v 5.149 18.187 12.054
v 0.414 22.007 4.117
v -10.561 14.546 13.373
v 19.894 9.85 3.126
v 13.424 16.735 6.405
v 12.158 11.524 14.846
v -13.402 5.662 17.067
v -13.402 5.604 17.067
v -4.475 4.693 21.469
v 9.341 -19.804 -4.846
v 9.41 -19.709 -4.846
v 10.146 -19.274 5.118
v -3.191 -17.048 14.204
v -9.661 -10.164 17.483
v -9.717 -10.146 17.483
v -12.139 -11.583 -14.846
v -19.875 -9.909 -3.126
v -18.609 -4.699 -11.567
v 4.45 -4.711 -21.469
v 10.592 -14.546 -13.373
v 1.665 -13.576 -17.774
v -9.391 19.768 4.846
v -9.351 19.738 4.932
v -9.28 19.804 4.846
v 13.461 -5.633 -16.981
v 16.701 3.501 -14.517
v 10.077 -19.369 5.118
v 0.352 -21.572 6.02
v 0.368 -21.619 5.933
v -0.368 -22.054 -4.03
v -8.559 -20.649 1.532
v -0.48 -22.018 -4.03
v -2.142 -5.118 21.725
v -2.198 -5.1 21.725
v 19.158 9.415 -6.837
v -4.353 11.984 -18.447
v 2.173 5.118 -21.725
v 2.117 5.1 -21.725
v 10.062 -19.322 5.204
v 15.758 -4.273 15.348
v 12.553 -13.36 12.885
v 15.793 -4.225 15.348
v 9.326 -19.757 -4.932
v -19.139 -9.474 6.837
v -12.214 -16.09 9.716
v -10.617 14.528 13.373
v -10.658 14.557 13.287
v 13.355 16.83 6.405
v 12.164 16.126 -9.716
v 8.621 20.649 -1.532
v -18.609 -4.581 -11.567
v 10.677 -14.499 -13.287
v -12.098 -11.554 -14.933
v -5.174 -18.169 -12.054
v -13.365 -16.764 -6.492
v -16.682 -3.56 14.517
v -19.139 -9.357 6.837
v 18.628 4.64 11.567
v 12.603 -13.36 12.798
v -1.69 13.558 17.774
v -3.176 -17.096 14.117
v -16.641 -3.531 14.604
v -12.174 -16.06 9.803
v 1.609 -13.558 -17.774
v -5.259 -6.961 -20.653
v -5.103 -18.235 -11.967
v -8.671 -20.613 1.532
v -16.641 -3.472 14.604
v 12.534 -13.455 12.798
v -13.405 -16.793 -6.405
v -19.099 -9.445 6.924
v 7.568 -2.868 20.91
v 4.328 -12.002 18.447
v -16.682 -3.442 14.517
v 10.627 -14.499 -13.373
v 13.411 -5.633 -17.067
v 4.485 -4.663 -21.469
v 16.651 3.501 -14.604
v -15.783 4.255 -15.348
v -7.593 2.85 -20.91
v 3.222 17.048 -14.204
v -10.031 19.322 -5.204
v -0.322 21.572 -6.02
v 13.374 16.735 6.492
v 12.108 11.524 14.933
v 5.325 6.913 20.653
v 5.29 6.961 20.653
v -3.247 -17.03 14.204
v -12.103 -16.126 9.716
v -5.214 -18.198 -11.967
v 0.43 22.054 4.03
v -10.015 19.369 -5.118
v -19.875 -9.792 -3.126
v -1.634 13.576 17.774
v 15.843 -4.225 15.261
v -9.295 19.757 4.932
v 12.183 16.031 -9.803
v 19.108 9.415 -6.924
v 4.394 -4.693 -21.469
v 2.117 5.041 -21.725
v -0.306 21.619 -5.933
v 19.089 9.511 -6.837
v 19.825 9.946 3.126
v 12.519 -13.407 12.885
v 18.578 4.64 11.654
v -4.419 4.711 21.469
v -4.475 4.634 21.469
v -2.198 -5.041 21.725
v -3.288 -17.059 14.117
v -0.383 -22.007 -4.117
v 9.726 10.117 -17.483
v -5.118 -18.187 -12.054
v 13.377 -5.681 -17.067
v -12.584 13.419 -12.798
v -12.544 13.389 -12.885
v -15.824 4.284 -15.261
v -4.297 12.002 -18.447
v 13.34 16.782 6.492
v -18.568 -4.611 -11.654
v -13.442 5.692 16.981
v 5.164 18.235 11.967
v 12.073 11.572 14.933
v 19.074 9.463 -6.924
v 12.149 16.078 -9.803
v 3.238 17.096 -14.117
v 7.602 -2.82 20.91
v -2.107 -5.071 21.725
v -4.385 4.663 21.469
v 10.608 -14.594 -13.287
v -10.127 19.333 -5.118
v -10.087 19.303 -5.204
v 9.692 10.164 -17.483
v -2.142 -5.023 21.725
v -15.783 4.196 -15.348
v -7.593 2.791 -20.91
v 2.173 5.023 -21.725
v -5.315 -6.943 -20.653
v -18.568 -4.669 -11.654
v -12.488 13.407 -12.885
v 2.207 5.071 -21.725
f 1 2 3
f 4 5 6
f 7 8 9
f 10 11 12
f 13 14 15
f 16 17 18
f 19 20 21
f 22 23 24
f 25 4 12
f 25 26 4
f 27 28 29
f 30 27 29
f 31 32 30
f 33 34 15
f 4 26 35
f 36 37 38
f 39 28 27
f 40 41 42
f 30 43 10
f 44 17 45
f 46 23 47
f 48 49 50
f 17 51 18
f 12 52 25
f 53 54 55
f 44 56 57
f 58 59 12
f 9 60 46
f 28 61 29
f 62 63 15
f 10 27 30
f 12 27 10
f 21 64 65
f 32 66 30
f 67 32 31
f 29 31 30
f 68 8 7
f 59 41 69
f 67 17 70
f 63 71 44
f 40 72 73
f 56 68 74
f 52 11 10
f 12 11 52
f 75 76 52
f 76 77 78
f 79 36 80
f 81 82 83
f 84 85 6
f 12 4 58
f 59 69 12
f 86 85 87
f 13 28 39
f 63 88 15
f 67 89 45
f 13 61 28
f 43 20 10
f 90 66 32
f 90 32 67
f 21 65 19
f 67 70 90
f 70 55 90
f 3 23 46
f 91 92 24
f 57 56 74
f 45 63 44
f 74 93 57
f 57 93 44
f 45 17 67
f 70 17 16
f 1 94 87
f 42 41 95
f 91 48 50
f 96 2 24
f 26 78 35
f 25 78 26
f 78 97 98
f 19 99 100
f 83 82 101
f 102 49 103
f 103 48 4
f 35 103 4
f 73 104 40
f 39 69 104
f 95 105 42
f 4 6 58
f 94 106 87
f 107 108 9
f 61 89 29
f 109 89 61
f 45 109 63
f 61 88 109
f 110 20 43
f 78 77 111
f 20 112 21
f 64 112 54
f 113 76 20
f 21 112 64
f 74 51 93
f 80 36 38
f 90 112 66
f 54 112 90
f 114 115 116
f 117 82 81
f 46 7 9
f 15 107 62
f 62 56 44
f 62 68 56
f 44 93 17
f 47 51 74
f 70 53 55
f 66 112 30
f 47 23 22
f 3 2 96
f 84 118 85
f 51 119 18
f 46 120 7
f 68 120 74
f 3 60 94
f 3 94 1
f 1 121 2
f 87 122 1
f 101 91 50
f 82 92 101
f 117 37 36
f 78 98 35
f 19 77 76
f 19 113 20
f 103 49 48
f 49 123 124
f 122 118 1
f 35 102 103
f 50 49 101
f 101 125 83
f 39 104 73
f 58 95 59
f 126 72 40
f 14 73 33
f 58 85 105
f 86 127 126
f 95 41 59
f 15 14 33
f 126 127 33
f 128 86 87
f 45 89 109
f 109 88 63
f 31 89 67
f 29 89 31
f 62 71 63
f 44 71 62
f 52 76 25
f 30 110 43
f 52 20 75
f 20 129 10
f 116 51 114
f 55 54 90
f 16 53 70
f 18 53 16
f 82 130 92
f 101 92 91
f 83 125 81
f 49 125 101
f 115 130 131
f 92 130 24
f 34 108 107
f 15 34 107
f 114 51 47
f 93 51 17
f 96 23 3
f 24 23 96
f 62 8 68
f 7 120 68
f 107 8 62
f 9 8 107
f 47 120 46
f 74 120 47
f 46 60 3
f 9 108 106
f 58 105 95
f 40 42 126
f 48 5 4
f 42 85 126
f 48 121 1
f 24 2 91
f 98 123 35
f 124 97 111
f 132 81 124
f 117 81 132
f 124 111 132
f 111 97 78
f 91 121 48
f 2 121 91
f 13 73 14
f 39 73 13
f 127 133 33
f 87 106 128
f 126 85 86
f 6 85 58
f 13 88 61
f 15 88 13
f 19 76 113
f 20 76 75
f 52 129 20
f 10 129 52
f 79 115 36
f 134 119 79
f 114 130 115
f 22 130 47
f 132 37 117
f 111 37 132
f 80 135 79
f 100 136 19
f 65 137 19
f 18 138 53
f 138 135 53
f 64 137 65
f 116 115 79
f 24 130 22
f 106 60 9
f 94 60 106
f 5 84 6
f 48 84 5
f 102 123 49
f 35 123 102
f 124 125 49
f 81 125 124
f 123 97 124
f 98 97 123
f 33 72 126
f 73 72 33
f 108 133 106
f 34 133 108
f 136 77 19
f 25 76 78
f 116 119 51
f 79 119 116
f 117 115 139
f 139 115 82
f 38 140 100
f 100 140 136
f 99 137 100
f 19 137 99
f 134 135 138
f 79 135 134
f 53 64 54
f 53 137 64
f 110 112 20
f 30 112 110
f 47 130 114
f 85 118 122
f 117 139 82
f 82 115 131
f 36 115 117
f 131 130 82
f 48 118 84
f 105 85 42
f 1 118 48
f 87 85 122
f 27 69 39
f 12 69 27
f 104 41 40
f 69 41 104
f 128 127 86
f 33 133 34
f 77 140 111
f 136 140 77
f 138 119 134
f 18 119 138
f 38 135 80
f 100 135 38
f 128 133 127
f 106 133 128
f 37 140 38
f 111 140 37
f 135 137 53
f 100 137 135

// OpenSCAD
// Auto-generated OpenSCAD file

    inner_points = 10*[[0.9310411281195976, -1.9708956644454598, -0.48456235421219784], [-0.033699334115551816, 2.1524185182257494, -0.5933185103962525], [-0.03989472684997508, -2.195916826294735, -0.40302069458653744], [-1.0046351890851246, 1.9273973563764744, -0.5117768507705921], [1.0046351890851246, -1.9273973563764744, 0.5117768507705921], [0.03989472684997508, 2.195916826294735, 0.40302069458653744], [0.033699334115551816, -2.1524185182257494, 0.5933185103962525], [-0.9310411281195976, 1.9708956644454598, 0.48456235421219784], [0.4434653698557001, -0.46631153386828283, -2.1382142073749177], [0.21572104012363613, 0.5070709058311078, -2.1638880532059384], [-0.5274704851138725, -0.6913326957175581, -2.0566725477492573], [-0.7552148148459366, 0.2820497439818326, -2.082346393580278], [0.7552148148459366, -0.2820497439818326, 2.082346393580278], [0.5274704851138725, 0.6913326957175581, 2.0566725477492573], [-0.21572104012363613, -0.5070709058311078, 2.1638880532059384], [-0.4434653698557001, 0.46631153386828283, 2.1382142073749177], [-1.9794000073382254, -0.9850428428689444, -0.3126246729896607], [1.9058059463726982, 0.9415445347999587, -0.6837145319931293], [-1.9058059463726982, -0.9415445347999587, 0.6837145319931293], [1.9794000073382254, 0.9850428428689444, 0.3126246729896607], [-0.8589781717453047, -2.055421900397042, 0.1531838416188064], [0.8589781717453047, 2.055421900397042, -0.1531838416188064], [0.16498829102009893, -1.3528633341160017, -1.7687870534721224], [-0.4312541049635078, 1.1954849770692983, -1.83600205447966], [0.4312541049635078, -1.1954849770692983, 1.83600205447966], [-0.16498829102009893, 1.3528633341160017, 1.7687870534721224], [1.6601035855989856, 0.3501270813904757, -1.4517351994968535], [-1.8527753385768673, -0.4640071303681936, -1.1567147034721392], [1.8527753385768673, 0.4640071303681936, 1.1567147034721392], [-1.6601035855989856, -0.3501270813904757, 1.4517351994968535], [1.0576657968809553, -1.4498599519447088, -1.3286523846946763], [0.32066966437787003, 1.7000717910271093, -1.4117346950477099], [-0.5133414173557517, -1.8139518400048271, -1.1967152079212828], [-1.2503375498588372, 1.335979902966991, -1.2797975182743164], [1.2503375498588372, -1.335979902966991, 1.2797975182743164], [0.5133414173557517, 1.8139518400048271, 1.1967152079212828], [-0.32066966437787003, -1.7000717910271093, 1.4117346950477099], [-1.0576657968809553, 1.4498599519447088, 1.3286523846946763], [1.3361428757165568, -0.56330815169699, -1.6980795385974714], [0.9676448094650141, 1.0116577197889192, -1.7396206937739882], [-1.2058001934897236, -1.152421201606384, -1.4846007021984173], [-1.574298259741266, 0.4225446698795252, -1.5261418573749341], [1.574298259741266, -0.4225446698795252, 1.5261418573749341], [1.2058001934897236, 1.152421201606384, 1.4846007021984173], [-0.9676448094650141, -1.0116577197889192, 1.7396206937739882], [-1.3361428757165568, 0.56330815169699, 1.6980795385974714], [-1.332424862251081, -1.6734569141071347, -0.6405106717159389], [1.2133471702387264, 1.6030751731984023, -0.9716000262702639], [-1.2133471702387264, -1.6030751731984023, 0.9716000262702639], [1.332424862251081, 1.6734569141071347, 0.6405106717159389]];

    outer_points = 10*[[-1.5351098190494932, -1.528959426375013, -0.5401748730333669], [0.2552450391175369, 2.060125161586024, 0.8226799293199251], [-0.8609437043177841, -2.060125161586024, -0.026985812856419433], [0.929411153849246, 1.528959426375013, 1.3358689894968725], [-0.929411153849246, -1.528959426375013, -1.3358689894968725], [0.8609437043177841, 2.060125161586024, 0.026985812856419433], [-0.2552450391175369, -2.060125161586024, -0.8226799293199251], [1.5351098190494932, 1.528959426375013, 0.5401748730333669], [-1.8312961423876284, -0.15805110227230856, 1.2678494648208398], [-1.4086506920132147, 0.6892168374833194, 1.589575841638257], [-1.157130027655919, -0.6892168374833194, 1.7810385249977874], [-0.7344845772815055, 0.15805110227230856, 2.1027649018152044], [0.7344845772815055, -0.15805110227230856, -2.1027649018152044], [1.157130027655919, 0.6892168374833194, -1.7810385249977874], [1.4086506920132147, -0.6892168374833194, -1.589575841638257], [1.8312961423876284, 0.15805110227230856, -1.2678494648208398], [0.9137346872778909, -1.5486610507140617, 1.323935741932434], [-1.519433352478138, 1.5486610507140617, -0.5282416254689284], [1.519433352478138, -1.5486610507140617, 0.5282416254689284], [-0.9137346872778909, 1.5486610507140617, -1.323935741932434], [0.11792209889297003, -2.228027076027857, 0.08976471789754577], [-0.11792209889297003, 2.228027076027857, -0.08976471789754577], [-1.6489692559528297, -1.109088131929166, 1.0182788842139632], [-0.542469101682108, 1.109088131929166, 1.8605694737993177], [0.542469101682108, -1.109088131929166, -1.8605694737993177], [1.6489692559528297, 1.109088131929166, -1.0182788842139632], [-2.0124478047987377, 0.960887841826382, 0.11320938958748228], [0.42670811236404715, -0.960887841826382, 1.969944851962293], [-0.42670811236404715, 0.960887841826382, -1.969944851962293], [2.0124478047987377, -0.960887841826382, -0.11320938958748228], [-2.0221363939633368, -0.9411862174873333, 0.10583423699649219], [-0.6544269861707203, 1.8006304307180756, 1.146962662532367], [-0.9313127062639702, -1.8006304307180756, 0.9361915790174082], [0.4363967015286464, 0.9411862174873333, 1.977320004553283], [-0.4363967015286464, -0.9411862174873333, -1.977320004553283], [0.9313127062639702, 1.8006304307180756, -0.9361915790174082], [0.6544269861707203, -1.8006304307180756, -1.146962662532367], [2.0221363939633368, 0.9411862174873333, -0.10583423699649219], [-2.2044632803981354, 0.009850812169524326, 0.35540481760336906], [-1.520608576501827, 1.380759136272229, 0.8759690303713064], [-0.4394734779670596, -1.380759136272229, 1.6989512198012324], [0.2443812259292486, -0.009850812169524326, 2.2195154325691697], [-0.2443812259292486, 0.009850812169524326, -2.2195154325691697], [0.4394734779670596, 1.380759136272229, -1.6989512198012324], [1.520608576501827, -1.380759136272229, -0.8759690303713064], [2.2044632803981354, -0.009850812169524326, -0.35540481760336906], [0.04755309694678411, -1.9685323451599084, 1.0529421097713736], [-1.0275941241812274, 1.9685323451599084, 0.2345180153148959], [1.0275941241812274, -1.9685323451599084, -0.2345180153148959], [-0.04755309694678411, 1.9685323451599084, -1.0529421097713736]];

    // Convex hull for inner set (I)
    module inner_hull() {
        hull() {
            for (p = inner_points) {
                translate(p) sphere(r=0.1);
            }
        }
    }

    // Convex hull for outer set (O) minus inner hull (O \ I)
    module outer_minus_inner() {
        difference() {
            hull() {
                for (p = outer_points) {
                    translate(p) sphere(r=0.1);
                }
            }
            inner_hull(); // Subtract inner hull
        }
    }

    // Convex hull for outer set (O) minus all translated inner hulls
    module outer_minus_AllTranslationInner() {
        difference() {
            hull() {
                for (p = outer_points) {
                    translate(p) sphere(r=0.1);
                }
            }
            hull() {
                translate([0,0,50]) inner_hull();
                translate([0,0,-50]) inner_hull();
            }; // Subtract translated inner hulls
        }
    }

    // Difference between outer_minus_inner and outer_minus_AllTranslationInner
    module outer_minus_inner_diff() {
        difference() {
            // Outer minus inner
            difference() {
                hull() {
                    for (p = outer_points) {
                        translate(p) sphere(r=0.1);
                    }
                }
                inner_hull();
            }

            // Subtract Outer minus AllTranslationInner
            difference() {
                hull() {
                    for (p = outer_points) {
                        translate(p) sphere(r=0.1);
                    }
                }
                hull() {
                    translate([0,0,50]) inner_hull();
                    translate([0,0,-50]) inner_hull();
                };
            }
        }
    }

    // Rendering all with colors applied
    color([1, 0, 0, 0.5]) inner_hull(); // Transparent red
    
